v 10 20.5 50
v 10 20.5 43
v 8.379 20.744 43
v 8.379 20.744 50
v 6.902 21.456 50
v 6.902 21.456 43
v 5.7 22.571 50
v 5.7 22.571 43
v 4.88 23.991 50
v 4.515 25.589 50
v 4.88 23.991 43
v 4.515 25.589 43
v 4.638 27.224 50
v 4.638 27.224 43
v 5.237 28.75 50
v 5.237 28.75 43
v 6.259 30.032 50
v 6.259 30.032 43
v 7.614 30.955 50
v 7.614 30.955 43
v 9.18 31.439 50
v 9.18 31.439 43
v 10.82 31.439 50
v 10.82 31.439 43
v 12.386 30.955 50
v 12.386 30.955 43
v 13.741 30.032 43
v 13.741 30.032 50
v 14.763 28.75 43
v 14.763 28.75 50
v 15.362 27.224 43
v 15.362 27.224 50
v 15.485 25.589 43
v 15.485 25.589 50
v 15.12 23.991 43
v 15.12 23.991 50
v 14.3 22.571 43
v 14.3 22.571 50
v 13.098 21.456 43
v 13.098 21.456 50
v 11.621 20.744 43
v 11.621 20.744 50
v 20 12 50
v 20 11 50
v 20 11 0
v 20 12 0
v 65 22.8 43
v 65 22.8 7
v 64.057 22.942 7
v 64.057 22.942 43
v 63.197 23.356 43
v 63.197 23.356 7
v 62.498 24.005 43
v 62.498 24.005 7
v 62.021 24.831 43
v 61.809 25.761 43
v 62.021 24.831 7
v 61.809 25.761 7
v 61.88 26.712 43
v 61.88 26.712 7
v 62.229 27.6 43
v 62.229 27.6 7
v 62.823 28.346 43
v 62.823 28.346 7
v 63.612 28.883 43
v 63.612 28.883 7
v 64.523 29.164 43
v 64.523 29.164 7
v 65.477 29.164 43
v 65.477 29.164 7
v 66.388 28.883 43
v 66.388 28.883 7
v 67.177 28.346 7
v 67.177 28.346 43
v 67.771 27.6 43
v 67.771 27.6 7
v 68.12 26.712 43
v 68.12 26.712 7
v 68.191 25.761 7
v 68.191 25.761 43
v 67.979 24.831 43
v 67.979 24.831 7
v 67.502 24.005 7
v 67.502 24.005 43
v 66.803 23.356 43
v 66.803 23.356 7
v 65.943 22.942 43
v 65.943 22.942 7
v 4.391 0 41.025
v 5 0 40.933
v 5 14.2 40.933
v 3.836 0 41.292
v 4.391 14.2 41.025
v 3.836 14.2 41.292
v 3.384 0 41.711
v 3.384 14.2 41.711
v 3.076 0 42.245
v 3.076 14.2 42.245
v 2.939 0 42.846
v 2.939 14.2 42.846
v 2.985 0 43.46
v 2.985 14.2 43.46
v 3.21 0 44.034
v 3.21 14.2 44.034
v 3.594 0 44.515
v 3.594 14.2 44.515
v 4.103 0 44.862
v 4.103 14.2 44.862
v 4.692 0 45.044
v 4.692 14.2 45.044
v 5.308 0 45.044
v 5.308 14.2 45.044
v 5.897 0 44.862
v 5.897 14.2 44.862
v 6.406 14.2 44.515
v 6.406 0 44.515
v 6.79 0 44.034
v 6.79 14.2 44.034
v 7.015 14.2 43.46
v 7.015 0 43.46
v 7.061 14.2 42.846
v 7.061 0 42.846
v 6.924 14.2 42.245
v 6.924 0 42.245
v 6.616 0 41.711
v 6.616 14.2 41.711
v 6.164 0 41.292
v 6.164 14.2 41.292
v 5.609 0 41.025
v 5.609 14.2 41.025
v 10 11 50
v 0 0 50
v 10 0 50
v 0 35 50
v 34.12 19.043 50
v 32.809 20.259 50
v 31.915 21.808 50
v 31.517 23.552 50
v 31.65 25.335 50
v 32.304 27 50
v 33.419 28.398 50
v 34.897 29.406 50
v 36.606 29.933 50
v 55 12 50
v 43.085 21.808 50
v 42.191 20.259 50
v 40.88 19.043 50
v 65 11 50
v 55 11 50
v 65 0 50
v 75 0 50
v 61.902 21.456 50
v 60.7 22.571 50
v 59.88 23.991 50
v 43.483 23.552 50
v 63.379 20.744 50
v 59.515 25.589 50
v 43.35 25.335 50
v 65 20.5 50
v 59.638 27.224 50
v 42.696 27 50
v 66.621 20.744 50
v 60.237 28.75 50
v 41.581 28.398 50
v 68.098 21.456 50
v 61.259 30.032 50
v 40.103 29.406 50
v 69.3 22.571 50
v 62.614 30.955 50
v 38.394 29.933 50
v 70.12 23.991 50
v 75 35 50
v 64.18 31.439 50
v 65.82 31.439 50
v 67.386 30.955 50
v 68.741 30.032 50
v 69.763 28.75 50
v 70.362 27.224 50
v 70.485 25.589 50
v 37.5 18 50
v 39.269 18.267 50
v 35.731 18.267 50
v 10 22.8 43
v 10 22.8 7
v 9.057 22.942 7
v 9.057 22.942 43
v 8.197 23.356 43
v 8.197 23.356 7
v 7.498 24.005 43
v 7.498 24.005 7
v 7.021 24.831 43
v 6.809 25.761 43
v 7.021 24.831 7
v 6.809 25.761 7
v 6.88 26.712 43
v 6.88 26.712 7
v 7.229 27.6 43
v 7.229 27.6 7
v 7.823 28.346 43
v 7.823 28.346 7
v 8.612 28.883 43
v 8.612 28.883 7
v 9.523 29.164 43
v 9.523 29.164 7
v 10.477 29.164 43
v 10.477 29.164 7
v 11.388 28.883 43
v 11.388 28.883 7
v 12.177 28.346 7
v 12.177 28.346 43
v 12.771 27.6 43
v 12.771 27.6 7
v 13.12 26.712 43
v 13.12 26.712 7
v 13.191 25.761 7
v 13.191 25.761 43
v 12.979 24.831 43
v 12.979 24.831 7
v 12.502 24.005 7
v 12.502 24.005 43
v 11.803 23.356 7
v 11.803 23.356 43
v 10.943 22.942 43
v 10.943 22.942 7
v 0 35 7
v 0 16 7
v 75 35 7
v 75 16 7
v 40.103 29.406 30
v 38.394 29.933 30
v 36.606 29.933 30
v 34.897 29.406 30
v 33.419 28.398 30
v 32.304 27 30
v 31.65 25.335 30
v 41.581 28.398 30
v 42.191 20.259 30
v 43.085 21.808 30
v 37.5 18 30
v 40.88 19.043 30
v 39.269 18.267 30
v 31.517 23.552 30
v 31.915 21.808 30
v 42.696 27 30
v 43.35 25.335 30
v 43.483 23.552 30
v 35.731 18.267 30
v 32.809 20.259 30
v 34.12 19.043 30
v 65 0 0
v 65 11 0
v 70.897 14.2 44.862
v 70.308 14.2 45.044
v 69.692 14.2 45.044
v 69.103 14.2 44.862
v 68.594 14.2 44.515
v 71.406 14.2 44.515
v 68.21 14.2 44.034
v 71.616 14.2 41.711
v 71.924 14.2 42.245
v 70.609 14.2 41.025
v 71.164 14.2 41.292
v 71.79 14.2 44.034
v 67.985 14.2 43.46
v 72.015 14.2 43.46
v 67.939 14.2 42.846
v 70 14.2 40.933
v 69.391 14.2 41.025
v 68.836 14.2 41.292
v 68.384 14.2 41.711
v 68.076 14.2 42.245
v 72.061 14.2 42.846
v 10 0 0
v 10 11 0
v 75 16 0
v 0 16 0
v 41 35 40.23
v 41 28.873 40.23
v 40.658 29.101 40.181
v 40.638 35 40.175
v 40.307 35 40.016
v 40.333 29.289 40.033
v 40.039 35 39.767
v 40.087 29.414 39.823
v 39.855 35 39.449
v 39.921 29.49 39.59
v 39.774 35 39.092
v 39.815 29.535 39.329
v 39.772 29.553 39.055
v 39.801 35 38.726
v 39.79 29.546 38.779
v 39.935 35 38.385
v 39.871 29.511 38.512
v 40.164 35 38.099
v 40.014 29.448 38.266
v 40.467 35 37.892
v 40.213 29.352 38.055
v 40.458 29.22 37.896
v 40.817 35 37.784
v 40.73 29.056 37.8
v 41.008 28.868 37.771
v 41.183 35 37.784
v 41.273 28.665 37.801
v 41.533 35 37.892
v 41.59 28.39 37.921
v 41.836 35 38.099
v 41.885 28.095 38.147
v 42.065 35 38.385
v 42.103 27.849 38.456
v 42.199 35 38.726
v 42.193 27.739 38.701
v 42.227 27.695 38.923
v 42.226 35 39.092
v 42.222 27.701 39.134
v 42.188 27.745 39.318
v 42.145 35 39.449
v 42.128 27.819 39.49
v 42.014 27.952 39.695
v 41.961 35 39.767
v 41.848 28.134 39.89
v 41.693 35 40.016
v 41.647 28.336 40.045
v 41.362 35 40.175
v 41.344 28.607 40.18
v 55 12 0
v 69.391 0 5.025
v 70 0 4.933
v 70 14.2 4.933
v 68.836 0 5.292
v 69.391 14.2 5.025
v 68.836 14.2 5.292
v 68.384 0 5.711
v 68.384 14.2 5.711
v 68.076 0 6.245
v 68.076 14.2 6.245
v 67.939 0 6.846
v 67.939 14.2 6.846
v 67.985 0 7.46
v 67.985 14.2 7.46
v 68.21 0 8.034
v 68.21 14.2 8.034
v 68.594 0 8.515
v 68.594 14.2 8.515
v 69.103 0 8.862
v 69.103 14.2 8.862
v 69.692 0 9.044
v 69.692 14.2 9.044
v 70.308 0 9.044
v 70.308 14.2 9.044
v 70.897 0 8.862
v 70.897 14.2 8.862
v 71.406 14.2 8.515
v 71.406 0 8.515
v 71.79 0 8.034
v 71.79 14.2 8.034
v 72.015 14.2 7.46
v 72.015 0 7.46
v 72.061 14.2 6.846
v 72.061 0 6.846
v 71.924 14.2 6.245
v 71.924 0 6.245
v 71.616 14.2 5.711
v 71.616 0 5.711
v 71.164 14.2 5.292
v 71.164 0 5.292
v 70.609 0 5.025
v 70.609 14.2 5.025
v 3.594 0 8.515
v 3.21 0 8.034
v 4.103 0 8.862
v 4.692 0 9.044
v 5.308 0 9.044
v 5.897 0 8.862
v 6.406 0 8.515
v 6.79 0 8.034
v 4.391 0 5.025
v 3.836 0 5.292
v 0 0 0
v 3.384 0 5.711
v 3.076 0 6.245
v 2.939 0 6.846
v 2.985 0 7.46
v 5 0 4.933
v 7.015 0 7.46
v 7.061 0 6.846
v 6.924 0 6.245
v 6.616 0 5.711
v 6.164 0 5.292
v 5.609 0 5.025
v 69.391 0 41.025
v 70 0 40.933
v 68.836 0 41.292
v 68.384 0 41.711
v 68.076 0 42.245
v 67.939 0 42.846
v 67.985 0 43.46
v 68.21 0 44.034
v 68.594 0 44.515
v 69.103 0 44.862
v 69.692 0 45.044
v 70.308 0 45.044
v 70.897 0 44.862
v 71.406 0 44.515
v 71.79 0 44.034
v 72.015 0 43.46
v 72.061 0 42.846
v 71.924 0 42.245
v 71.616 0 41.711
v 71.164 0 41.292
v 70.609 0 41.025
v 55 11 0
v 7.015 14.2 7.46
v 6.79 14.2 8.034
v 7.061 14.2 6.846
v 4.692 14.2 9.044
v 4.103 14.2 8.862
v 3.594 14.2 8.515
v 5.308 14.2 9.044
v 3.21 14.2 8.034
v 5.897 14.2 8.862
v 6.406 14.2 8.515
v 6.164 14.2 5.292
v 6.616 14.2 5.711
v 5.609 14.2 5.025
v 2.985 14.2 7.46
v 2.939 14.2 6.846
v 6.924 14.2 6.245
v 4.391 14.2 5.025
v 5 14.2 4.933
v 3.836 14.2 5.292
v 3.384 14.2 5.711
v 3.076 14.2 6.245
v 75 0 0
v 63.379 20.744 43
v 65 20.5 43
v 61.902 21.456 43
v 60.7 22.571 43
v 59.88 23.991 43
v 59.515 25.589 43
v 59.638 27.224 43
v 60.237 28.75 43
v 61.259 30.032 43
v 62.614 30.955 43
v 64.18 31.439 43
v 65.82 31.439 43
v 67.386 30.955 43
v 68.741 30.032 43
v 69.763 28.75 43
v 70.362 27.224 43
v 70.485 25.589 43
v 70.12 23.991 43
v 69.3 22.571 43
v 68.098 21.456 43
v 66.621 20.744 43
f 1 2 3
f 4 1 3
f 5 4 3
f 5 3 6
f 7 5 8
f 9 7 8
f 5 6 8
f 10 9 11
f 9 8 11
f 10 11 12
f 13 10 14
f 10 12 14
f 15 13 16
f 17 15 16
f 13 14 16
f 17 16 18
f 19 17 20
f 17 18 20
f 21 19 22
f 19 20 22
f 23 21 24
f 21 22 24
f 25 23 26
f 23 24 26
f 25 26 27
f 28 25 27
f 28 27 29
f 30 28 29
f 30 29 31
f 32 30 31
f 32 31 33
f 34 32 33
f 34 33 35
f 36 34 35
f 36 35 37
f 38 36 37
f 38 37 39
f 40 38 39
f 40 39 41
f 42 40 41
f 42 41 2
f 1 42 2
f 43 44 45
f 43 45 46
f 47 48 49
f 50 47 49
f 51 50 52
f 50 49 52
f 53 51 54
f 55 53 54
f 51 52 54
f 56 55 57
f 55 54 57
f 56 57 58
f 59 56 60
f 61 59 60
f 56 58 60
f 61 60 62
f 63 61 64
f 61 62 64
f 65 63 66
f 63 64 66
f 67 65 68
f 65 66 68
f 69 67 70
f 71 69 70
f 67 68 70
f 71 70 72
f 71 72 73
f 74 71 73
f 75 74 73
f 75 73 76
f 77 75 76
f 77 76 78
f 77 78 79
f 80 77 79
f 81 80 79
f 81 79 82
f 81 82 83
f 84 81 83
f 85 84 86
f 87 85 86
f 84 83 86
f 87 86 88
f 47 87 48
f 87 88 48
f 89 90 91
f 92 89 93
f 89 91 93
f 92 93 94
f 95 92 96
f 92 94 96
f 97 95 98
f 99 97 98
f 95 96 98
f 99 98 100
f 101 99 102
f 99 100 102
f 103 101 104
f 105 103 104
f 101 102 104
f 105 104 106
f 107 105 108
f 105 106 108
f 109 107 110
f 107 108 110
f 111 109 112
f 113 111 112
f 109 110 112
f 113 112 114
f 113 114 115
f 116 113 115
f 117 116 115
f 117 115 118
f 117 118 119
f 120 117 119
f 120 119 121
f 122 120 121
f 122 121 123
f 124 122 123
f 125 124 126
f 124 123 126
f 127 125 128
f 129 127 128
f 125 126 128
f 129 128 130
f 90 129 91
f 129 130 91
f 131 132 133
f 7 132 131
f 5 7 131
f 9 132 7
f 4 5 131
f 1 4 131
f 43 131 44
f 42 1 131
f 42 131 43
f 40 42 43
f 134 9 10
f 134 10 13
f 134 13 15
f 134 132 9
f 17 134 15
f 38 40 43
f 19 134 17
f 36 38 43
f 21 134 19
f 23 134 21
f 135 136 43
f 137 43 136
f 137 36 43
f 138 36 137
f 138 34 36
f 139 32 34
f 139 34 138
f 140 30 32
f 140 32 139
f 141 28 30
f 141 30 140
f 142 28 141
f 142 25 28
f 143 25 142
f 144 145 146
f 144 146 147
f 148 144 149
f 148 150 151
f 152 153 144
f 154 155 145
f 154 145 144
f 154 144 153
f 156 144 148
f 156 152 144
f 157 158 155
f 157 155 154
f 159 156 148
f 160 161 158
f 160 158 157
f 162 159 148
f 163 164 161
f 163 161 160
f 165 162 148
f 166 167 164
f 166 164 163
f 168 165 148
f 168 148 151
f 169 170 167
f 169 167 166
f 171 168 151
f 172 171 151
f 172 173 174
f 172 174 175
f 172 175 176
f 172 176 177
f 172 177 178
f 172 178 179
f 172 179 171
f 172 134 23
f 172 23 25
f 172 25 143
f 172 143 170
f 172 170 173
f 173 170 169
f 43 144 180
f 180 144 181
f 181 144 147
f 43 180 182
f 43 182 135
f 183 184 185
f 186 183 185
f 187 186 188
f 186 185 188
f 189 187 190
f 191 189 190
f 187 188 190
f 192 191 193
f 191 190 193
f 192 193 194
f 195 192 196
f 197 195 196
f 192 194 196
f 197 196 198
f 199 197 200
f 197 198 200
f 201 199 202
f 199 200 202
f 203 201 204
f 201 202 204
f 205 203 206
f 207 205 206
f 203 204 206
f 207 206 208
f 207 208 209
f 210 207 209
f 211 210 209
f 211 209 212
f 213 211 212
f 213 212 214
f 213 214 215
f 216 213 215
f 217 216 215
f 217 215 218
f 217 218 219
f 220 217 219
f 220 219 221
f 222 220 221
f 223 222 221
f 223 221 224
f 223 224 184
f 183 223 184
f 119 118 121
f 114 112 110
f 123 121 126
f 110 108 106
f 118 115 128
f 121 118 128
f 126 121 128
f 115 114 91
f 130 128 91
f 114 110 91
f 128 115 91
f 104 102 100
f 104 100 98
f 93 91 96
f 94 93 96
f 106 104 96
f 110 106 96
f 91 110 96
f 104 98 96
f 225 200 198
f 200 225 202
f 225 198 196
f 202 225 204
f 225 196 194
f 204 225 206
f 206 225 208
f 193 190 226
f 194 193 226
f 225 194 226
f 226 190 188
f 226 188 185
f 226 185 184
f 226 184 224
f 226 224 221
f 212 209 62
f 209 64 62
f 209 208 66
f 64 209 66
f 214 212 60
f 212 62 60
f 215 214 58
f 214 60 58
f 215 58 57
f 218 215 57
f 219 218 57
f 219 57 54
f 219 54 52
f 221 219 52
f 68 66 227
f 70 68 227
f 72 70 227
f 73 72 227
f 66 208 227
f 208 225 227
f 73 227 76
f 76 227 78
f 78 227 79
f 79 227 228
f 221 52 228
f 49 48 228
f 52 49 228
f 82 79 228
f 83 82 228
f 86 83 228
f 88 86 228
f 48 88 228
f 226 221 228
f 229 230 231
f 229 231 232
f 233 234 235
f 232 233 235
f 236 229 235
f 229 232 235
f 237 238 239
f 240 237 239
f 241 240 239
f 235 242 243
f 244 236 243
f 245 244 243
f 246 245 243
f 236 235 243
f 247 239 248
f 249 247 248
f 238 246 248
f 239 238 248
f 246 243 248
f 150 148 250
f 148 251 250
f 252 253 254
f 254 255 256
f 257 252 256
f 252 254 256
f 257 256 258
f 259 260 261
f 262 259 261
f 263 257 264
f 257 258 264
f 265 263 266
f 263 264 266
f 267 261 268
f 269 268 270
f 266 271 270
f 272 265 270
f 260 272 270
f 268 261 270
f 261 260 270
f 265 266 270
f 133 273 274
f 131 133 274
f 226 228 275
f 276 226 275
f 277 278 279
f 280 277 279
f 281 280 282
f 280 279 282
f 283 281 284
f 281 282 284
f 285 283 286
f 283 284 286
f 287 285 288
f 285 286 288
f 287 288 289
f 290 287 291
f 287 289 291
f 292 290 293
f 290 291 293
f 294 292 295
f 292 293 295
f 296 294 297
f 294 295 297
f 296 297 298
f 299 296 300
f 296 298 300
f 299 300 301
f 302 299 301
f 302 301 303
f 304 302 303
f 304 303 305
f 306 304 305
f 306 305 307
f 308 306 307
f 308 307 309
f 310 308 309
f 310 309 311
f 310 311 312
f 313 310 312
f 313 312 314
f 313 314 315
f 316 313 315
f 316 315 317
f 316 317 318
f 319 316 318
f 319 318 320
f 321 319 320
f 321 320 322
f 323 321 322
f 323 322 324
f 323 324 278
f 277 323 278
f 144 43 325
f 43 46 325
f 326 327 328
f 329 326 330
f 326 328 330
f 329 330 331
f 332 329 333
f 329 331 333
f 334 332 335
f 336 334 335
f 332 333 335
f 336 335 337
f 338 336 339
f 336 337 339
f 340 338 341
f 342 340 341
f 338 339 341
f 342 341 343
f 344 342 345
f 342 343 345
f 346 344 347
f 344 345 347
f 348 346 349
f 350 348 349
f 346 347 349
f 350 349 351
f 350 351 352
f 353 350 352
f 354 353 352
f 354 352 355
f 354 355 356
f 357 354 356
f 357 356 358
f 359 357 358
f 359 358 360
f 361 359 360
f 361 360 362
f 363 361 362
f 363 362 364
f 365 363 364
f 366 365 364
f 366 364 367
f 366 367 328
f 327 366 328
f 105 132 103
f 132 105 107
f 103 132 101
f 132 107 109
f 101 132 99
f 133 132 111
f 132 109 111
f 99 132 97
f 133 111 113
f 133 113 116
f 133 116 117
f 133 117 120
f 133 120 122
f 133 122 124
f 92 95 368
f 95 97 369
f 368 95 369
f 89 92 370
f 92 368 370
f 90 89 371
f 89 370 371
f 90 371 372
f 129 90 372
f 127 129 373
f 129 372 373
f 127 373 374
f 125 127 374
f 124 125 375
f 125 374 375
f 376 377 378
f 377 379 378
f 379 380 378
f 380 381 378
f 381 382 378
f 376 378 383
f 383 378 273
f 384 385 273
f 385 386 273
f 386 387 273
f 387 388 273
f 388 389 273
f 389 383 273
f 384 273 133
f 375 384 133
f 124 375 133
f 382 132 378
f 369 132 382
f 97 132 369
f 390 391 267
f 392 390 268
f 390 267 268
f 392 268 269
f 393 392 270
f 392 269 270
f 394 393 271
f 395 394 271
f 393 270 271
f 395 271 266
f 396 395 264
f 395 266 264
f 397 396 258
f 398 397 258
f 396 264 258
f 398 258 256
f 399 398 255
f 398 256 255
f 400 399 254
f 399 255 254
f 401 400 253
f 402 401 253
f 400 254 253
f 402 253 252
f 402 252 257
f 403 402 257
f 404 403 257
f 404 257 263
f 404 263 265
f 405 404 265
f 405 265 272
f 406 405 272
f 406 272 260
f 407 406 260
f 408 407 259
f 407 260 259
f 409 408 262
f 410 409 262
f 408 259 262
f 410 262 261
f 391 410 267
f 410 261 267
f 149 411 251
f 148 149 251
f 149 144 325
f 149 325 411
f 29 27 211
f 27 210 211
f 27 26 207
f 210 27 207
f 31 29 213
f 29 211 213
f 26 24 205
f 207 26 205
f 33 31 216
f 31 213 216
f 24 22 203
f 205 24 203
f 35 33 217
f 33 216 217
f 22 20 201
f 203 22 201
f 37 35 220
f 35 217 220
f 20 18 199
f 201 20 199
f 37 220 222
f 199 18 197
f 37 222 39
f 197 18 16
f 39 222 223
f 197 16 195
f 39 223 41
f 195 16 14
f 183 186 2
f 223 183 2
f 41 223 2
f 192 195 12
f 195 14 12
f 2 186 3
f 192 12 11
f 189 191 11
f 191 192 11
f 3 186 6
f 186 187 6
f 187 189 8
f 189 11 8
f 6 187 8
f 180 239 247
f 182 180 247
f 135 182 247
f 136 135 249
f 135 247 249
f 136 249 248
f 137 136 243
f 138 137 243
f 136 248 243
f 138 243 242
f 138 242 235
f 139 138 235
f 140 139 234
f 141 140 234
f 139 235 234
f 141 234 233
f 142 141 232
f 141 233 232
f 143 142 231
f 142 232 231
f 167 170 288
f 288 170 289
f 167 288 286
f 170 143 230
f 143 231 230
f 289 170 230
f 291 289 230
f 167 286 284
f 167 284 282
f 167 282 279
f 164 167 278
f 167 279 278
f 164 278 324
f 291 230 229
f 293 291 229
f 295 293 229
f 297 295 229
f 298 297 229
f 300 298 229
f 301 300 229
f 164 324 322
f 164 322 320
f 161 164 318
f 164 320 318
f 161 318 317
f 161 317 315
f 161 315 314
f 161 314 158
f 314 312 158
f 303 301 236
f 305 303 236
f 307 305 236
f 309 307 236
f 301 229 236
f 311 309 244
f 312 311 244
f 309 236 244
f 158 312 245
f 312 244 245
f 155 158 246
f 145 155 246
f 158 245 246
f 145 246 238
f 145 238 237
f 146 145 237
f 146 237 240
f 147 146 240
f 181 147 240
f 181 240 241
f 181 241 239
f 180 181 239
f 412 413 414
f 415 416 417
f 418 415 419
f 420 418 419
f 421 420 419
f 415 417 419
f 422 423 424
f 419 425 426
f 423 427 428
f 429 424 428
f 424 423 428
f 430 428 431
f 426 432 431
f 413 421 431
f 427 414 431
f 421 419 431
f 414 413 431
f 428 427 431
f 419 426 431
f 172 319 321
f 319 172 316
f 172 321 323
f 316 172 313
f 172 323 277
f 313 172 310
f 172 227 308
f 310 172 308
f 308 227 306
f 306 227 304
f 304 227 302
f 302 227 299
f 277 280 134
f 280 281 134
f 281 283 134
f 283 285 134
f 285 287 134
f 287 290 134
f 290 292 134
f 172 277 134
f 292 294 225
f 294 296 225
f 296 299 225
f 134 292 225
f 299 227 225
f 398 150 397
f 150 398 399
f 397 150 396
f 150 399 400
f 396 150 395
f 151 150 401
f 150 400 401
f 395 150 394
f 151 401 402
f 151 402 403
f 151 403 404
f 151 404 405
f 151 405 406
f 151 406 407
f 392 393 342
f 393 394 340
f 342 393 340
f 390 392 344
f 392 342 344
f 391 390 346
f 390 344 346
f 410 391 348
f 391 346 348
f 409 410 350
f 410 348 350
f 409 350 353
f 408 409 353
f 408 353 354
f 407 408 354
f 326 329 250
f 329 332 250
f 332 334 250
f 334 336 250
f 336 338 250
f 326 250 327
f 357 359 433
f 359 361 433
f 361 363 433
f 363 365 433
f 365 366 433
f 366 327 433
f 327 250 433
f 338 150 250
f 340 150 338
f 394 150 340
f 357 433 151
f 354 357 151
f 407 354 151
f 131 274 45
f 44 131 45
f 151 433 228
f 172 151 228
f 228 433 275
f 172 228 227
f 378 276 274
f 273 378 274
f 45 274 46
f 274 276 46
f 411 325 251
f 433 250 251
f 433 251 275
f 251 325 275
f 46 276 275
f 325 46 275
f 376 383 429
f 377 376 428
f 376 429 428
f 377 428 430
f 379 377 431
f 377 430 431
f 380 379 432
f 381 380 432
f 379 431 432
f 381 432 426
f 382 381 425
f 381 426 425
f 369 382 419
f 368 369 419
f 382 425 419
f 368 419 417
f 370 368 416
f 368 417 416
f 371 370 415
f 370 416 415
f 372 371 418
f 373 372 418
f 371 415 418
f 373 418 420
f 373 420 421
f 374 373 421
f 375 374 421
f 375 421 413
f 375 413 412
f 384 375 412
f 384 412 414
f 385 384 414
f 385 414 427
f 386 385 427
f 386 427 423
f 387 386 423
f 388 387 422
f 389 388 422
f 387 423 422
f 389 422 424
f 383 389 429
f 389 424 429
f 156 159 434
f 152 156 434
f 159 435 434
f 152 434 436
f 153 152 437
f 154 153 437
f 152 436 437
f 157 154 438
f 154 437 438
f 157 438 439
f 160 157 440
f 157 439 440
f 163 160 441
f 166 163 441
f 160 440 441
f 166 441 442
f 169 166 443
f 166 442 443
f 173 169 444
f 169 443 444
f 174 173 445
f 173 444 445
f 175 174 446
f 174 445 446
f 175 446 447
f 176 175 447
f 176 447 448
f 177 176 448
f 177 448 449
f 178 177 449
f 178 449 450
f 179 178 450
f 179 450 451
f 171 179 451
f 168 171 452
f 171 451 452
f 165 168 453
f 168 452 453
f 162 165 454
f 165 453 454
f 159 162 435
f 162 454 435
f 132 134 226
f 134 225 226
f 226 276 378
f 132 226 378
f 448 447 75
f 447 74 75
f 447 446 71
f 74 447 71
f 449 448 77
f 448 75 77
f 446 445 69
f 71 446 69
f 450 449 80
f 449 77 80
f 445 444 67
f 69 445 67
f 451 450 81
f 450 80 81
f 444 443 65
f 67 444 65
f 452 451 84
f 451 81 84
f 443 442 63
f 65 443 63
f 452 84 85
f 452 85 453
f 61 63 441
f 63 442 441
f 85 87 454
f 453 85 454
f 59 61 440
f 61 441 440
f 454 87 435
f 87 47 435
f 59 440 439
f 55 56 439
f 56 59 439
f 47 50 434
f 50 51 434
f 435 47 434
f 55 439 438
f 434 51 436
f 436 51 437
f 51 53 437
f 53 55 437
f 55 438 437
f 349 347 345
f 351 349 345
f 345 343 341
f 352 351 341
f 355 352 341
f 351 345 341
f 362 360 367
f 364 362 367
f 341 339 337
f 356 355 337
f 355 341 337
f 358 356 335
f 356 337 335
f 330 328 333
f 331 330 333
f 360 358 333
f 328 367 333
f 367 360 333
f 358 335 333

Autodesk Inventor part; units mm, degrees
ref_plane "YZ Plane" through (0, 0, 0) normal (1, 0, 0) x (0, 1, 0)
ref_plane "XZ Plane" through (0, 0, 0) normal (0, 1, 0) x (-1, 0, 0)
ref_plane "XY Plane" through (0, 0, 0) normal (0, 0, 1) x (1, 0, 0)
sketch "Sketch1" plane through (0, 0, 0) normal (0, 0, 1) x (1, 0, 0)
  line L0 (75, 0) -> (75, 35)
  line L1 (75, 35) -> (0, 35)
  line L2 (0, 35) -> (0, 0)
  line L3 (0, 0) -> (10, 0)
  line L4 (10, 0) -> (10, 11)
  line L5 (10, 11) -> (20, 11)
  line L6 (20, 11) -> (20, 12)
  line L7 (20, 12) -> (55, 12)
  line L8 (55, 12) -> (55, 11)
  line L9 (55, 11) -> (65, 11)
  line L10 (65, 11) -> (65, 0)
  line L11 (65, 0) -> (75, 0)
  dimension "d0" = 75
  dimension "d1" = 35
  dimension "d2" = 10
  dimension "d3" = 11
  dimension "d4" = 10
  dimension "d5" = 90
  dimension "d6" = 1
  dimension "d7" = 35
  dimension "d8" = 10
  dimension "d9" = 11
extrude "Extrusion1" add sketch "Sketch1" along normal blind 50
sketch "Sketch2" plane through (75, 0, 0) normal (1, 0, 0) x (0, 0, -1)
  line L0 (0, 35) -> (-50, 35) projected
  line L1 (0, 35) -> (-7, 35)
  line L2 (-7, 35) -> (-7, 16)
  line L3 (-7, 16) -> (0, 16)
  line L4 (0, 16) -> (0, 35)
  point P0 (0, 0)
  dimension "d12" = 7
  dimension "d13" = 19
extrude "Extrusion2" cut sketch "Sketch2" against normal through all
sketch "Sketch3" plane through (0, 0, 50) normal (0, 0, 1) x (1, 0, 0)
  line L0 (0, 0) -> (10, 0) projected
  line L1 (65, 0) -> (75, 0) projected
  line L2 (75, 0) -> (75, 35) projected
  line L3 (0, 35) -> (0, 0) projected
  point P0 (10, 26)
  point P1 (65, 26)
  dimension "d16" = 26
  dimension "d17" = 26
  dimension "d18" = 10
  dimension "d19" = 10
hole "Hole1" at (10, 26, 50) at (65, 26, 50) direction (0, 0, -1) diameter 6.4 end through all counterbore diameter 11 counterbore depth 7
sketch "Sketch4" plane through (0, 0, 50) normal (0, 0, 1) x (1, 0, 0)
  line L0 (65, 0) -> (75, 0) projected
  line L1 (75, 0) -> (75, 35) projected
  point P0 (0, 0)
  point P1 (37.5, 24)
  dimension "d27" = 24
  dimension "d28" = 37.5
hole "Hole2" at (37.5, 24, 50) direction (0, 0, -1) diameter 12 depth 20
sketch "Sketch5" plane through (0, 35, 50) normal (0, 1, 0) x (1, 0, 0)
  line L0 (75, 43) -> (75, 0) projected
  line L1 (75, 0) -> (0, 0) projected
  point P0 (0, 50)
  point P1 (41, 11)
  dimension "d36" = 34
  dimension "d44" = 11
hole "Hole3" at (41, 35, 39) direction (0, -1, 0) diameter 2.459 depth 8.8 thread size "M3x0.5" class "6H" standard "ISO Metric profile"
sketch "Sketch6" plane through (0, 0, 0) normal (0, -1, 0) x (1, 0, 0)
  line L0 (75, 0) -> (75, 50) projected
  line L1 (0, 0) -> (0, 50) projected
  line L2 (0, 50) -> (10, 50) projected
  line L3 (0, 0) -> (10, 0) projected
  line L4 (65, 50) -> (75, 50) projected
  point P0 (5, 43)
  point P1 (5, 7)
  point P2 (70, 43)
  point P3 (70, 7)
  dimension "d45" = 5
  dimension "d46" = 5
  dimension "d47" = 5
  dimension "d48" = 5
  dimension "d50" = 7
  dimension "d51" = 7
  dimension "d52" = 7
  dimension "d60" = 36
hole "Hole4" at (5, 0, 43) at (5, 0, 7) at (70, 0, 43) at (70, 0, 7) direction (0, 1, 0) diameter 4.134 depth 14.2 thread size "M5x0.8" class "6H" standard "ISO Metric profile"
properties part number "lose back" material "Steel, Mild"
